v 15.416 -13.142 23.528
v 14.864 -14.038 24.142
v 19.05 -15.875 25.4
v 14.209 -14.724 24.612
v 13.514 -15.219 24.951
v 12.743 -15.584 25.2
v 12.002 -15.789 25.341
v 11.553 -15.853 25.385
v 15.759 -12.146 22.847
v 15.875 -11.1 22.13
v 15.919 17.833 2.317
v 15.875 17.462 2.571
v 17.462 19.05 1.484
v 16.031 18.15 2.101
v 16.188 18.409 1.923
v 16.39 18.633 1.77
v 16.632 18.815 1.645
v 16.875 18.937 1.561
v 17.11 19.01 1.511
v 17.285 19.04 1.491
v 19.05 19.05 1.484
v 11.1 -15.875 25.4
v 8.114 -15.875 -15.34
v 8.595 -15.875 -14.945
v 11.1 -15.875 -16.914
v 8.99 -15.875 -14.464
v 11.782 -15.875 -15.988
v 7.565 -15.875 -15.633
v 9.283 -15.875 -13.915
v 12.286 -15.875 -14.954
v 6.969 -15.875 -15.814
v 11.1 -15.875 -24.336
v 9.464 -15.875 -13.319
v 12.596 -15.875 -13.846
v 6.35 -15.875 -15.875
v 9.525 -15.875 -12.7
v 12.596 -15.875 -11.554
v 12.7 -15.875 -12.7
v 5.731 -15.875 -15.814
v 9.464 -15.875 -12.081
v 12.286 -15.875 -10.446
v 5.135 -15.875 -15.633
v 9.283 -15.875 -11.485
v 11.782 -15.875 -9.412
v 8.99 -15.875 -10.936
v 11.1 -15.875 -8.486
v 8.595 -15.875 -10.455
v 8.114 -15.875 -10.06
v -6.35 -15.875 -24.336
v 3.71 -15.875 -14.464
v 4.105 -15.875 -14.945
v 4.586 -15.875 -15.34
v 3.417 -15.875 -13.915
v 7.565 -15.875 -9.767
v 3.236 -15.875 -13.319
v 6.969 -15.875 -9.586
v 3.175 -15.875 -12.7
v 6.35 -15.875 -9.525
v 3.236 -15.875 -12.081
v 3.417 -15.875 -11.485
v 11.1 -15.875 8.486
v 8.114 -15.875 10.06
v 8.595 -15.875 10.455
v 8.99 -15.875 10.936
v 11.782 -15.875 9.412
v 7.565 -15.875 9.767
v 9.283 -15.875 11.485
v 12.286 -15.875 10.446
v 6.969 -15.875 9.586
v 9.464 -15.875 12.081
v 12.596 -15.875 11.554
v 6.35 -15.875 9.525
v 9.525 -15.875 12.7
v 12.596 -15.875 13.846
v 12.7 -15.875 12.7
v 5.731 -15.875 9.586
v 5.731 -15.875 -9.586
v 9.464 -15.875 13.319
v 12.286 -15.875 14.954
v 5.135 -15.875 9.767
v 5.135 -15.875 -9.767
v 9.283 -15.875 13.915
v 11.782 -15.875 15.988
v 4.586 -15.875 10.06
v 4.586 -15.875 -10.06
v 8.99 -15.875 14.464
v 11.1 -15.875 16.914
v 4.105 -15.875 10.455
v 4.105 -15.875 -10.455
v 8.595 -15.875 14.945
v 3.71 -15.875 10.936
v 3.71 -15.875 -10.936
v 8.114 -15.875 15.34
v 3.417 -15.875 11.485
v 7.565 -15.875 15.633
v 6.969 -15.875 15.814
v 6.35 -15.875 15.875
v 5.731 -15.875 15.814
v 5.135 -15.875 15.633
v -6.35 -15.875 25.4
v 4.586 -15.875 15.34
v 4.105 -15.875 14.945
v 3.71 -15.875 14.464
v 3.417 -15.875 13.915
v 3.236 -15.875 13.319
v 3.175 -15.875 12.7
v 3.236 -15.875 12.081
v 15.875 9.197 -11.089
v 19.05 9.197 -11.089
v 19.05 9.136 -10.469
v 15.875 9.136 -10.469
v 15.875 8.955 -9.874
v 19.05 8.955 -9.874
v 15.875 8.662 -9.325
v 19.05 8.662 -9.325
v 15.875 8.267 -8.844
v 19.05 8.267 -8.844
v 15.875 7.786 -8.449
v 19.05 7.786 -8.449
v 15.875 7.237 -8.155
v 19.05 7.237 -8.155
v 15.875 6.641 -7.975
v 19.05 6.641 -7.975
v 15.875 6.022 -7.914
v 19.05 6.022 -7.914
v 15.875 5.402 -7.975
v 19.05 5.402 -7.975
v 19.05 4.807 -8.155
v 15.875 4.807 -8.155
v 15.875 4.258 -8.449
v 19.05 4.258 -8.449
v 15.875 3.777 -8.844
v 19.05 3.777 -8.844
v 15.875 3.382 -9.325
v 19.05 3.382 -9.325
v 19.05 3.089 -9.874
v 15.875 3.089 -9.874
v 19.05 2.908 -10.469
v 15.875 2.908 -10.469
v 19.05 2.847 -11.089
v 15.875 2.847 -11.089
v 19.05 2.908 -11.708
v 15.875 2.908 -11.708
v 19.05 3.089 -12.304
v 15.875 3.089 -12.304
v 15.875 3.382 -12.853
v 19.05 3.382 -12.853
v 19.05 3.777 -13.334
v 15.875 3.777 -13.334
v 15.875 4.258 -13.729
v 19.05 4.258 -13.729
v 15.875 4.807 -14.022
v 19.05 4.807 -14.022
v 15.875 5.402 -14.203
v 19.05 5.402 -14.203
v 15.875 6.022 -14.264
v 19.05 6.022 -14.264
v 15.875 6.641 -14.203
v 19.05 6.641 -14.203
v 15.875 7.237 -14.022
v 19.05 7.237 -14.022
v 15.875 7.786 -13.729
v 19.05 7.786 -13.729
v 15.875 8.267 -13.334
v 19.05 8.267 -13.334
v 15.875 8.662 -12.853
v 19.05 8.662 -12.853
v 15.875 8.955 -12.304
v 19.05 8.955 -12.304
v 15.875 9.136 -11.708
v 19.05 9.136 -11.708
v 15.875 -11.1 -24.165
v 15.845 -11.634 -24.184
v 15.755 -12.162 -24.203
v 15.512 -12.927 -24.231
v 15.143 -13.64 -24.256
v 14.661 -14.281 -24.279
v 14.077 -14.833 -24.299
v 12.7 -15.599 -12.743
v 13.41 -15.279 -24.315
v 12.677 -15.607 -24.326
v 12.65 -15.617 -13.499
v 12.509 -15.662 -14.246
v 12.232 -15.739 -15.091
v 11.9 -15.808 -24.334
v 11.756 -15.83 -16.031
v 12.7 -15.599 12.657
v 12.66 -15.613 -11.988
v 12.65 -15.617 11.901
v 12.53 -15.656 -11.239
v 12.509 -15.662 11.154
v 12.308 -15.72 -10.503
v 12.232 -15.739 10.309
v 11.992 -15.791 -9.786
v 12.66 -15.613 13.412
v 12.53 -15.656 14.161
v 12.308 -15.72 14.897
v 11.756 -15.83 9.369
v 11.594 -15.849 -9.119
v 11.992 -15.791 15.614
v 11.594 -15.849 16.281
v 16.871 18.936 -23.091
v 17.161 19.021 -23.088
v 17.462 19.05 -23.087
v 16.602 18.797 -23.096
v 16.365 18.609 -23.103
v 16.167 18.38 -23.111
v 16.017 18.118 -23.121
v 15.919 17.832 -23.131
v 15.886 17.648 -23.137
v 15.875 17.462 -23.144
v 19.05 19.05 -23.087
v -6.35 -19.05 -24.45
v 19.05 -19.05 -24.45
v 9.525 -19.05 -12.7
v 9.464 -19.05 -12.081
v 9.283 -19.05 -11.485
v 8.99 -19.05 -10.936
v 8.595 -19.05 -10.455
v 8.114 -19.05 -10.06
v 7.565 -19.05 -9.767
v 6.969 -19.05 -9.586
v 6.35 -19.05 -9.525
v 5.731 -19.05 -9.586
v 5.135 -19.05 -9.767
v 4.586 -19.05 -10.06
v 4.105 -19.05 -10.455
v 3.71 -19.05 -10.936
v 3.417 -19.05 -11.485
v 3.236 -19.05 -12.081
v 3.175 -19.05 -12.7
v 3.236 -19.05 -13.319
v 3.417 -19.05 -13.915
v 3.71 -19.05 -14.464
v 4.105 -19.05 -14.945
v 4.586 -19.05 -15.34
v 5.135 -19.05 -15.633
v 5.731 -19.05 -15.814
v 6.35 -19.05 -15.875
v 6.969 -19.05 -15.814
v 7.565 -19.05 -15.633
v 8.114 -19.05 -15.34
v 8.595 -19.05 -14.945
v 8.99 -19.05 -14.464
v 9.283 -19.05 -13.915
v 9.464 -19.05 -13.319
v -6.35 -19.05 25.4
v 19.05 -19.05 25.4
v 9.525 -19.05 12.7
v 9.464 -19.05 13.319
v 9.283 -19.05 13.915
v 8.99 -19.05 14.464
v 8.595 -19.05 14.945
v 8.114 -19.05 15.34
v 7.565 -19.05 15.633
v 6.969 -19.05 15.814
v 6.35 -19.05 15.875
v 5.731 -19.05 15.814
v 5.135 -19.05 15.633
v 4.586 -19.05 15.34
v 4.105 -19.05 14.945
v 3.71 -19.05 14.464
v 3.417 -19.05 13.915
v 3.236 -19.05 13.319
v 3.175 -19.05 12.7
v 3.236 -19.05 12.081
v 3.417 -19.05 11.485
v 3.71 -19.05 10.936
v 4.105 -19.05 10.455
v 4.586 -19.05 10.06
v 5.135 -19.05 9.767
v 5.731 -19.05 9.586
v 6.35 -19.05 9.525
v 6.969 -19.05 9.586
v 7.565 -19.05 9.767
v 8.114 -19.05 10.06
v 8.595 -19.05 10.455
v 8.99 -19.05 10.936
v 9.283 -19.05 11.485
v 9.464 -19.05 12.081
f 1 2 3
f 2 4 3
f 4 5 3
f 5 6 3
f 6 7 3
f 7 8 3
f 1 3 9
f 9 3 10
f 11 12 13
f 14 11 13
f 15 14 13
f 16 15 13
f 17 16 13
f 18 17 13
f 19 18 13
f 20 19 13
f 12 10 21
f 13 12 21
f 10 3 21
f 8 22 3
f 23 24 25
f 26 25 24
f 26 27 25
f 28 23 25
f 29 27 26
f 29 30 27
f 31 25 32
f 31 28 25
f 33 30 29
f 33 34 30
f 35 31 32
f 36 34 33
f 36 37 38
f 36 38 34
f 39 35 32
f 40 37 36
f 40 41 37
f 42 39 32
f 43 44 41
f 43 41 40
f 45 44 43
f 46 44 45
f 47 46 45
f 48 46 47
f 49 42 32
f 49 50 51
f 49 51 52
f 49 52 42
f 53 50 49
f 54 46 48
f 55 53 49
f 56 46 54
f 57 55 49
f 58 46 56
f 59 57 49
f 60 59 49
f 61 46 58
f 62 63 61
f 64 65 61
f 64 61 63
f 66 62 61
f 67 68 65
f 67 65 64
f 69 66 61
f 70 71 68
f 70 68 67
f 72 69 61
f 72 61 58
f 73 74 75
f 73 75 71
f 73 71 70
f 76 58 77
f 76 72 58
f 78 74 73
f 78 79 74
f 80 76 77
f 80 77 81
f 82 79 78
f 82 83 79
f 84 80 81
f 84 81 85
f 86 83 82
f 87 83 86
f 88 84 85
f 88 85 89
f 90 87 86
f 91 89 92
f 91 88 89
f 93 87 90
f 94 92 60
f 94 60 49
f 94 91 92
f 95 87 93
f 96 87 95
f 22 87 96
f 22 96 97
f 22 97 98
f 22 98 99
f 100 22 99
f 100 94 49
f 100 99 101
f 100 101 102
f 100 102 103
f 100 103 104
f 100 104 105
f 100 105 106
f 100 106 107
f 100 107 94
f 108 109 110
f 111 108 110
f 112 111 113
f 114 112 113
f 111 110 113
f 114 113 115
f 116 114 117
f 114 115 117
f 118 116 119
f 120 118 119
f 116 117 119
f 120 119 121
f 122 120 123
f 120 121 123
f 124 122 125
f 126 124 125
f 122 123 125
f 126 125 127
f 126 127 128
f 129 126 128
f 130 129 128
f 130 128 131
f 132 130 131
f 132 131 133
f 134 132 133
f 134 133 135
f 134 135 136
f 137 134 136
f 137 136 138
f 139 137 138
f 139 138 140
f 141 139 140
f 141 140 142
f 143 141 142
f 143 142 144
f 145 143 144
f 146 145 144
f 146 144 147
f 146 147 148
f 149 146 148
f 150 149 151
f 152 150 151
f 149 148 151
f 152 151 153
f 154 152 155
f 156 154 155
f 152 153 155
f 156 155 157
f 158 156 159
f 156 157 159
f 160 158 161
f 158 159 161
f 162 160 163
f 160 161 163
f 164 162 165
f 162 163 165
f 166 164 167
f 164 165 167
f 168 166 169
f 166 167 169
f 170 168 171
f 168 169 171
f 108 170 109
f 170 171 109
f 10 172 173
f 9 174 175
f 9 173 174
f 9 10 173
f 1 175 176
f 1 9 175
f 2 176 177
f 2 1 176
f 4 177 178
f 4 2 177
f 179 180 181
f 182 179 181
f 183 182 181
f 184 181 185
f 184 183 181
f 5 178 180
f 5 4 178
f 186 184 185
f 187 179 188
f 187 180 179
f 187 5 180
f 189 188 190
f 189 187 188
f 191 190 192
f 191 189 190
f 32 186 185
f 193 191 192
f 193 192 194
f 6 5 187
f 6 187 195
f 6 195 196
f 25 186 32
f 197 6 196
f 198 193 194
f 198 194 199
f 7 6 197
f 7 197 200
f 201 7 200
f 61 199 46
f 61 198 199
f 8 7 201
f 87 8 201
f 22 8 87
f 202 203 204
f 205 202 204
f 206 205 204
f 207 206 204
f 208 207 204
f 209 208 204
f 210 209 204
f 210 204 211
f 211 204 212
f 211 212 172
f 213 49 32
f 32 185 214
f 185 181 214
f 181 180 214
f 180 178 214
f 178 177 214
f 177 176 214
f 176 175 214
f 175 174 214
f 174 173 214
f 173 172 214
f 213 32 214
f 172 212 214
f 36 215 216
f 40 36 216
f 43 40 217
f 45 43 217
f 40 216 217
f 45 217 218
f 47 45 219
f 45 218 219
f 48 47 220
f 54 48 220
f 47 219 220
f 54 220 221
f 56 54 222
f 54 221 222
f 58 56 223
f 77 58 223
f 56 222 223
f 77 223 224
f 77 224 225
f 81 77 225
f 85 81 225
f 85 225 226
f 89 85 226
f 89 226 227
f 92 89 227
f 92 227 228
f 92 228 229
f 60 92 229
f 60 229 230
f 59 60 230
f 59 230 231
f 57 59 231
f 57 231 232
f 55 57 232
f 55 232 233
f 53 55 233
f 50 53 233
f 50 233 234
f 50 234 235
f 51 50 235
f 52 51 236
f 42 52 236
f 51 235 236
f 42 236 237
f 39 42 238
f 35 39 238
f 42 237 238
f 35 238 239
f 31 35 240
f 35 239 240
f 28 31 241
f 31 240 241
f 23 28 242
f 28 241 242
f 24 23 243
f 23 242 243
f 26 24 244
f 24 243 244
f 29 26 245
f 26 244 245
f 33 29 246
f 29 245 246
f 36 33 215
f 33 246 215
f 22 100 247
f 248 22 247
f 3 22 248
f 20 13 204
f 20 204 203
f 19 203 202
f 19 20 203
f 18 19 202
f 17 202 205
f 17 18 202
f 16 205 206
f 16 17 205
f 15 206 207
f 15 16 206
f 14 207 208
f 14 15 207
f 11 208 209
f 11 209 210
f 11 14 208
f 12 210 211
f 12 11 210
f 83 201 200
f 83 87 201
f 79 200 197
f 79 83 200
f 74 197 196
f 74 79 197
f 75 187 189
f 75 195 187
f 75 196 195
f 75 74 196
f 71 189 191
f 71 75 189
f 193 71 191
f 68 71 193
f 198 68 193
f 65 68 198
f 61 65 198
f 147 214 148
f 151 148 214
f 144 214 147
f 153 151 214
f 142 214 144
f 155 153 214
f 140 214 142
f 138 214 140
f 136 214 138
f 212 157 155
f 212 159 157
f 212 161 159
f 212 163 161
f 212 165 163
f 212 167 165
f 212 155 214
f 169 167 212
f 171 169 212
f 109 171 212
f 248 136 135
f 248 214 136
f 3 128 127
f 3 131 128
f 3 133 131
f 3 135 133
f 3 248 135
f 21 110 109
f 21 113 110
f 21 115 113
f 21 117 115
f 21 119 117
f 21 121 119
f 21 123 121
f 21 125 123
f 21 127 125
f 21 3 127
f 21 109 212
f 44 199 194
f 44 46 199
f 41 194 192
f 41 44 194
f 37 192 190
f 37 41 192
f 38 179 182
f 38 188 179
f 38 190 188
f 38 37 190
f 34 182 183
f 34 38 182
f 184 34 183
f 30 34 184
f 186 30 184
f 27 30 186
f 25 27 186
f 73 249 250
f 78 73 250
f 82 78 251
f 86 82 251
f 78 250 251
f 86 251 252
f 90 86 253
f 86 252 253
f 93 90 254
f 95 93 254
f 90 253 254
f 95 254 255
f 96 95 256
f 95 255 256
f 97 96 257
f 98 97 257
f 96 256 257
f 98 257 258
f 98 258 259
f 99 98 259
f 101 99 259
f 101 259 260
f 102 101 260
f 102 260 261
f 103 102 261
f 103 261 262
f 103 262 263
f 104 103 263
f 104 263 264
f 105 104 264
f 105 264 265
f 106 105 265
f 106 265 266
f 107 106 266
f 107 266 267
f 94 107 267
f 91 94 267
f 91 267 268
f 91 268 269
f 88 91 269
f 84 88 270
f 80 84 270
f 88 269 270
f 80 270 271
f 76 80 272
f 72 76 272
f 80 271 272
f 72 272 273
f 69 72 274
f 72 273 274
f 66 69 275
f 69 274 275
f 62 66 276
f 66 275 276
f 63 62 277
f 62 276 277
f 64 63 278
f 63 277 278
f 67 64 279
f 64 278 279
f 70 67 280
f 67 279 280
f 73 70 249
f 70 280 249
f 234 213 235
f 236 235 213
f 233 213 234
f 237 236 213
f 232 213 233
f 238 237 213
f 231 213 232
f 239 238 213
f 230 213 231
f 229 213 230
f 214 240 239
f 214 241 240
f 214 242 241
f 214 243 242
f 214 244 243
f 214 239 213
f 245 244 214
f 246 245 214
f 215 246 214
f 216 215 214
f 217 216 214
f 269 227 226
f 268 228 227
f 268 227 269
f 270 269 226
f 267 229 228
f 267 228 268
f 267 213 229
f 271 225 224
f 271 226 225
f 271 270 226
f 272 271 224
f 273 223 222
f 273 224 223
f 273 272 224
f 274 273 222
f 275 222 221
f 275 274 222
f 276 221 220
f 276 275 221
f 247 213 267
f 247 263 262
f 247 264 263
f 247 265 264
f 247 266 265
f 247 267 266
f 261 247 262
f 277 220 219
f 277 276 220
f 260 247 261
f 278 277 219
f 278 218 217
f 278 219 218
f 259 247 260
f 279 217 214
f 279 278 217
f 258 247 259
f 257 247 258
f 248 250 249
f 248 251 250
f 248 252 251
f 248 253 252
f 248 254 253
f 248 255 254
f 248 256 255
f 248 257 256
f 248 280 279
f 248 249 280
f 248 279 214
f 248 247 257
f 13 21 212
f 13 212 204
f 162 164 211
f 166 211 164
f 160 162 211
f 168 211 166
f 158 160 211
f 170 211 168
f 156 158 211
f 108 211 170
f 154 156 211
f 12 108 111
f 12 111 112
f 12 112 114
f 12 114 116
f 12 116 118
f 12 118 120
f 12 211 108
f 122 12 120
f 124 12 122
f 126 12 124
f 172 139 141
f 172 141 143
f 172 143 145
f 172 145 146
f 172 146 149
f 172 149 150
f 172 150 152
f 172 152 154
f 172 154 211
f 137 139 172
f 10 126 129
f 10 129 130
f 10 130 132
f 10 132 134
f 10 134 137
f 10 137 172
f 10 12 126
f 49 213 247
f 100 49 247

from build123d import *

# Parameters (mm, degrees)
BOSS_EXTRUDE1_DEPTH = 25.4
SKETCH3_R           = 3.175
SKETCH3_W           = 12.7
SKETCH3_H           = 50.8
CUT_EXTRUDE1_DEPTH  = 50.595085442
SKETCH12_OUTSIDE_W  = 66.478
SKETCH12_OUTSIDE_H  = 53.778
CUT_EXTRUDE2_DEPTH  = 41.659838908
SKETCH13_R          = 3.175
CUT_EXTRUDE3_DEPTH  = 41.659838908
SKETCH14_R          = 6.35
CUT_EXTRUDE4_DEPTH  = 2.54


with BuildPart() as part:
    # Sketch2 → Boss-Extrude1 (new, symmetric)
    with BuildSketch(Plane.XY):
        with BuildLine():
            Line((-19.05, -19.05), (19.05, -19.05))
            Line((19.05, -19.05), (19.05, 19.05))
            Line((19.05, 19.05), (17.4625, 19.05))
            ThreePointArc((17.4625, 19.05), (16.339967985, 18.585032015), (15.875, 17.4625))
            Line((15.875, 17.4625), (15.875, -11.0998))
            ThreePointArc((15.875, -11.0998), (14.476376302, -14.476376302), (11.0998, -15.875))
            Line((11.0998, -15.875), (-17.4625, -15.875))
            ThreePointArc((-17.4625, -15.875), (-18.585032015, -16.339967985), (-19.05, -17.4625))
            Line((-19.05, -17.4625), (-19.05, -19.05))
        make_face()
    extrude(amount=BOSS_EXTRUDE1_DEPTH, both=True)

    # Sketch3 → Cut-Extrude1 (cut, through all)
    with BuildSketch(Plane.XZ.offset(19.05)):
        with Locations((6.35, 12.7)):
            Circle(SKETCH3_R)
        with Locations((6.35, -12.7)):
            Circle(SKETCH3_R)
        with Locations((-12.7, 0)):
            Rectangle(SKETCH3_W, SKETCH3_H)
    extrude(amount=-CUT_EXTRUDE1_DEPTH, mode=Mode.SUBTRACT)

    # Sketch12 outside → Cut-Extrude2 (cut, through all)
    with BuildSketch(Plane(origin=(19.05, 0, 0), x_dir=(0, 0, -1), z_dir=(1, 0, 0))):
        Rectangle(SKETCH12_OUTSIDE_W, SKETCH12_OUTSIDE_H)
        Polygon((23.087203004, 19.05), (24.449518438, -19.05), (-25.4, -19.05), (-25.4, -15.875), (-1.48415665, 19.05), align=None, mode=Mode.SUBTRACT)
    extrude(amount=-CUT_EXTRUDE2_DEPTH, mode=Mode.SUBTRACT)

    # Sketch13 → Cut-Extrude3 (cut, through all)
    with BuildSketch(Plane(origin=(19.05, 0, 0), x_dir=(0, 0, -1), z_dir=(1, 0, 0))):
        with Locations(Location((11.088634042, 6.021904729, 0), (0, 0, 90))):
            Circle(SKETCH13_R)
    extrude(amount=-CUT_EXTRUDE3_DEPTH, mode=Mode.SUBTRACT)

    # Sketch14 → Cut-Extrude4 (cut)
    with BuildSketch(Plane(origin=(0, -15.875, 0), x_dir=(1, 0, 0), z_dir=(0, 1, 0))):
        with Locations((6.35, -12.7)):
            Circle(SKETCH14_R)
        with Locations((6.35, 12.7)):
            Circle(SKETCH14_R)
    extrude(amount=CUT_EXTRUDE4_DEPTH, mode=Mode.SUBTRACT)


solid = part.part
